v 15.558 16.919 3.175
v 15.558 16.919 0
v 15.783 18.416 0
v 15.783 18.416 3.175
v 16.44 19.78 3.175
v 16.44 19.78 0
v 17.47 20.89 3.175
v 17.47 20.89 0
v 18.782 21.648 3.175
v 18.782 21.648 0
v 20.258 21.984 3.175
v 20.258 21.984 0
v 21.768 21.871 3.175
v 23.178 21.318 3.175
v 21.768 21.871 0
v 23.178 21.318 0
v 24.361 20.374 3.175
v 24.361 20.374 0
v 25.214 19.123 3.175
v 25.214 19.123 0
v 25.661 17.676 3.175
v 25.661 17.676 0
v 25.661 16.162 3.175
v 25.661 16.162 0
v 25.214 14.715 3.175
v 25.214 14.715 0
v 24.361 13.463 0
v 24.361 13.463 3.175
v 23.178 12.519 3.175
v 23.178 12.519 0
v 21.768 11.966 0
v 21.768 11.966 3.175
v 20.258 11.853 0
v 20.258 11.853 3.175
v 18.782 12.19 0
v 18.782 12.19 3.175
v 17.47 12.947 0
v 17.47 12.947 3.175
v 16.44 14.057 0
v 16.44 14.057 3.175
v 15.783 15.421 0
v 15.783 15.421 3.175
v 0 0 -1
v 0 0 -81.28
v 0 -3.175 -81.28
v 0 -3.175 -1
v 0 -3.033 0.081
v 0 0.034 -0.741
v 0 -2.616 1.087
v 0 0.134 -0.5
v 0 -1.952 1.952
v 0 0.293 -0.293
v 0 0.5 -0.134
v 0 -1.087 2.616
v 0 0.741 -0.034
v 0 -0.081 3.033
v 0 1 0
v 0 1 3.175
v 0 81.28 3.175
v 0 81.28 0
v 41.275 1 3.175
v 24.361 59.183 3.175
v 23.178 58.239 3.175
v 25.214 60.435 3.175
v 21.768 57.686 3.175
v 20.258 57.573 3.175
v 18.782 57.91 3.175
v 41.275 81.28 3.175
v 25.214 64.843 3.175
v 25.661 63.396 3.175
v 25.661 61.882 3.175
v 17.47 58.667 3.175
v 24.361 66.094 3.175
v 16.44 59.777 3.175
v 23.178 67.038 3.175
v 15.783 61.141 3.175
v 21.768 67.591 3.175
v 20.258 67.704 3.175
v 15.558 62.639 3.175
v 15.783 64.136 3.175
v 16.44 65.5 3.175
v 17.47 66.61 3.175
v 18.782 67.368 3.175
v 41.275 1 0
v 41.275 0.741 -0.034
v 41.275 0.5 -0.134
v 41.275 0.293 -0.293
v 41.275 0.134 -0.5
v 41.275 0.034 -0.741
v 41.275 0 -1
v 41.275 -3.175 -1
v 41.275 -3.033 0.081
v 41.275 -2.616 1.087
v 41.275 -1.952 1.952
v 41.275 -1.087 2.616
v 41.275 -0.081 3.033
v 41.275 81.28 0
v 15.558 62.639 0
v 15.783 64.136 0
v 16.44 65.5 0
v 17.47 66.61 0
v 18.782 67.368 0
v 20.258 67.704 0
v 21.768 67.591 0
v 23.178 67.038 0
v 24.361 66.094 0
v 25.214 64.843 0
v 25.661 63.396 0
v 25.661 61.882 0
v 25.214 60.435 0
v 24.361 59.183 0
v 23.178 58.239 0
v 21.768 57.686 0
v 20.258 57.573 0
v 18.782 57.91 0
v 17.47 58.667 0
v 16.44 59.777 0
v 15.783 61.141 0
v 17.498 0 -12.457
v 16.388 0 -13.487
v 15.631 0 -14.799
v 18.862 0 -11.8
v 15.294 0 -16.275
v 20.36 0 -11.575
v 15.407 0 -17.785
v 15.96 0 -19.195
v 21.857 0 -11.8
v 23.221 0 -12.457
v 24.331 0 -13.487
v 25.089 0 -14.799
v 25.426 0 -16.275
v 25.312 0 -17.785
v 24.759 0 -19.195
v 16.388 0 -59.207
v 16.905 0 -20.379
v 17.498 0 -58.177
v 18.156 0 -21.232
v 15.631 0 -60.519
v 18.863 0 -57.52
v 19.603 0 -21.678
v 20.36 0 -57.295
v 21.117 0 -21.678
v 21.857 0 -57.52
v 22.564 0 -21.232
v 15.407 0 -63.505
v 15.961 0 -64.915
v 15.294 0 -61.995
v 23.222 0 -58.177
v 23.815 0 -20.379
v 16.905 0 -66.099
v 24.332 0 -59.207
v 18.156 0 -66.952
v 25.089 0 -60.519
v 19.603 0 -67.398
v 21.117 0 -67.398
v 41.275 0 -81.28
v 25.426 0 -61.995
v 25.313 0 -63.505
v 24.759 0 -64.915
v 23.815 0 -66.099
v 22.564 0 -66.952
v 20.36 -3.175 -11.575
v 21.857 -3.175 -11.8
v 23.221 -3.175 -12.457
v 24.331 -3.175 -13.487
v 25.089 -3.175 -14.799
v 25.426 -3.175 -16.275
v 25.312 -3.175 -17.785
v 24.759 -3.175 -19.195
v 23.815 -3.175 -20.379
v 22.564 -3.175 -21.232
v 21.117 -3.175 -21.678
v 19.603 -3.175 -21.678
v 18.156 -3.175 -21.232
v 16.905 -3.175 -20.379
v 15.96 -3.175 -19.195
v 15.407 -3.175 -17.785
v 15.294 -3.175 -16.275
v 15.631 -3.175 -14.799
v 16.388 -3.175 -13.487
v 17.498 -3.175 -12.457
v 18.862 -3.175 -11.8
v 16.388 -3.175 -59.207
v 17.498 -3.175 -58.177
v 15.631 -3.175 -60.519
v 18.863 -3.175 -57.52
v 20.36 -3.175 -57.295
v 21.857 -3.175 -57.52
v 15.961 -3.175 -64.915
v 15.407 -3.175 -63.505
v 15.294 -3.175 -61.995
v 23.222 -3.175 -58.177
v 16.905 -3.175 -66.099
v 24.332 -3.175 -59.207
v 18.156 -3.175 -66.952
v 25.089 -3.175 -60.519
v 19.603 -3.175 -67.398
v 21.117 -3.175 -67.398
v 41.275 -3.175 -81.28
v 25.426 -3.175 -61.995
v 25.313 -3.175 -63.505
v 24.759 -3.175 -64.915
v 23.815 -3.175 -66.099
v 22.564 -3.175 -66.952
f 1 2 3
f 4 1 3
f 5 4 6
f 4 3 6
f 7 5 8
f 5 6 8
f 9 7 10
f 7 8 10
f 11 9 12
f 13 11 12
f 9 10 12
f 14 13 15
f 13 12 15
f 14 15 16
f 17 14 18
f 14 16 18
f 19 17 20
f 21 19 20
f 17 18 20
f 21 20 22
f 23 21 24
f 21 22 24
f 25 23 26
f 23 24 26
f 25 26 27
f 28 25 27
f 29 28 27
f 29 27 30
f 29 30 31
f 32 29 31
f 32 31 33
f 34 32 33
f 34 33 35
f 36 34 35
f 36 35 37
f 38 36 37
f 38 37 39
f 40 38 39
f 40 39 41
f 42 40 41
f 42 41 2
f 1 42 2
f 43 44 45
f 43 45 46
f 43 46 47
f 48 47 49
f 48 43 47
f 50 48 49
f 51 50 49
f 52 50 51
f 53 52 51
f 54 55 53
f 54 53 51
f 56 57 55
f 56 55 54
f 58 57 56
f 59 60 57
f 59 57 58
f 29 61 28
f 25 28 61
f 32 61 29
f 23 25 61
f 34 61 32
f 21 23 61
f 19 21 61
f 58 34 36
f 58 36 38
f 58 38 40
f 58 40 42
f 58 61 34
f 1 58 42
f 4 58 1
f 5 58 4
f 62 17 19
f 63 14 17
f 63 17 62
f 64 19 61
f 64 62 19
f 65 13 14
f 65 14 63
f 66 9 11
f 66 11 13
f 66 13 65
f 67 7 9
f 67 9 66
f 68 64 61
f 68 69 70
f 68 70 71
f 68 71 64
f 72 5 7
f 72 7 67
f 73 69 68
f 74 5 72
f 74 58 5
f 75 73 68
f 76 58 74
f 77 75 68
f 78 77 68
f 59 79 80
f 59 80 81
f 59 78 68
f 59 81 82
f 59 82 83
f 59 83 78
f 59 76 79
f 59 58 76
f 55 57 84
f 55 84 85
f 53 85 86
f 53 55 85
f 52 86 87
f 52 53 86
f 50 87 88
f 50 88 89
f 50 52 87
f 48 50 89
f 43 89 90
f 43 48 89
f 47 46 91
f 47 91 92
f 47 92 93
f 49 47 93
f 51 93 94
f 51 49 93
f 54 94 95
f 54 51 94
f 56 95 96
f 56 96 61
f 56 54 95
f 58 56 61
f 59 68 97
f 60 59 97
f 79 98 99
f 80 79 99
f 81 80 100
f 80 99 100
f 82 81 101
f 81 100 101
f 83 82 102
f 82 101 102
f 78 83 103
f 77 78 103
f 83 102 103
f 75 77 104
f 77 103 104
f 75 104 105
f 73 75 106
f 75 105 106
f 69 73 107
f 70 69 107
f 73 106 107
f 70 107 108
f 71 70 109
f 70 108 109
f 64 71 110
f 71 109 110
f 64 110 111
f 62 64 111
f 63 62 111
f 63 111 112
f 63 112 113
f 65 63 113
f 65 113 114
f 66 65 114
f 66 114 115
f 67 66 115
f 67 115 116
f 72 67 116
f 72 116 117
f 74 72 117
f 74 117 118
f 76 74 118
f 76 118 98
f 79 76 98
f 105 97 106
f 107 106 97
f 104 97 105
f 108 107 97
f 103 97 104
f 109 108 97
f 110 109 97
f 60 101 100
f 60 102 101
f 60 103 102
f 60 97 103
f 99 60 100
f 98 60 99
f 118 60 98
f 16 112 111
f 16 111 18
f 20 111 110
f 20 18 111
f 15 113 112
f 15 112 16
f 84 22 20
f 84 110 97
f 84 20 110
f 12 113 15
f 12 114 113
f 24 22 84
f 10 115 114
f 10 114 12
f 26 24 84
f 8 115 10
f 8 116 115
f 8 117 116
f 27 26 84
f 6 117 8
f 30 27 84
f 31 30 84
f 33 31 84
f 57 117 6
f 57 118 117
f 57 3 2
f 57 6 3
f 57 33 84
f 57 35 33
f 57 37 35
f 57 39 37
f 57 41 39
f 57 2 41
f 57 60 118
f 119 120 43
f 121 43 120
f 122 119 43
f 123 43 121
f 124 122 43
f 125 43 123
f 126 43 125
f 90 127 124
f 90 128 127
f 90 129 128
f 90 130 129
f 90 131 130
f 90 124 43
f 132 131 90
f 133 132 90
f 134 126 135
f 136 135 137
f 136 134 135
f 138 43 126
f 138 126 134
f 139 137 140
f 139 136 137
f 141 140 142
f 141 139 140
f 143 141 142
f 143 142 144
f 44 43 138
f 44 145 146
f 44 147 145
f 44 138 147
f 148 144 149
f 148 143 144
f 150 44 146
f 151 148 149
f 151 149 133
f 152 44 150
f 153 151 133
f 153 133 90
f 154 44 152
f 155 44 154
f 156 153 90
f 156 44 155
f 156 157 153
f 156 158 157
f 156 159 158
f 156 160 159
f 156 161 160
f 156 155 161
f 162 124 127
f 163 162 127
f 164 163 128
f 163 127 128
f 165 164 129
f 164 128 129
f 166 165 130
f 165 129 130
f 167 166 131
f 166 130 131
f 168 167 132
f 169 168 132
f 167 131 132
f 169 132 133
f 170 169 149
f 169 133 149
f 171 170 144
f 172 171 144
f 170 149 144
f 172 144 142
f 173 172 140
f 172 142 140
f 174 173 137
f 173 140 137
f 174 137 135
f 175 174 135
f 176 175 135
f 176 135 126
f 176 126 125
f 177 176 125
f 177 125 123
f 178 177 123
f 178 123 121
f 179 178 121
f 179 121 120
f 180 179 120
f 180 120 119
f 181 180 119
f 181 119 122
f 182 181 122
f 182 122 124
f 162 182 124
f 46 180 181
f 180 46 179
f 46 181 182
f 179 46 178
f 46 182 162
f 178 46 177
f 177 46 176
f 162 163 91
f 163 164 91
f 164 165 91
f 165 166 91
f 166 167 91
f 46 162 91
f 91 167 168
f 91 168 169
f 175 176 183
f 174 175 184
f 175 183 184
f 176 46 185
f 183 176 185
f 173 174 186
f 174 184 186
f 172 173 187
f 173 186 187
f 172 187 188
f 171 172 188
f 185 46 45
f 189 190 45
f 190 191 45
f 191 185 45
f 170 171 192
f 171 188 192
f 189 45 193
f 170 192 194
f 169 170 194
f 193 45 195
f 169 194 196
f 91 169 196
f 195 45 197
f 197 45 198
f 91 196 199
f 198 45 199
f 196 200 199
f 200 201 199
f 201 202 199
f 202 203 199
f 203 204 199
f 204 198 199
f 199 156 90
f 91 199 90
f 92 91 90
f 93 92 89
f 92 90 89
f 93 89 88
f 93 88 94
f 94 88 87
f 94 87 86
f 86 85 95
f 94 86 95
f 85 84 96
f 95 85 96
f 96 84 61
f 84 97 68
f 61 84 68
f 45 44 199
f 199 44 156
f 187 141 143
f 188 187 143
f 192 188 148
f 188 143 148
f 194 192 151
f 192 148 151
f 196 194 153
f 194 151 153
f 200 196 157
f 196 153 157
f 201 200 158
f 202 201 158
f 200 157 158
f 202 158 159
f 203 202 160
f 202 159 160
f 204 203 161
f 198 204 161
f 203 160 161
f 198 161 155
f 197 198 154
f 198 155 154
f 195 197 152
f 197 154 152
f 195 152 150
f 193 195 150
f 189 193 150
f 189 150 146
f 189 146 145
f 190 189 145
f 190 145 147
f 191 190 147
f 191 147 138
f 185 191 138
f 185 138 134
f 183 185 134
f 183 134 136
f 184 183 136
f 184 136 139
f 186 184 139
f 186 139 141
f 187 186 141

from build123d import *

# Parameters (mm, degrees)
SKETCH2_W                    = 41.275
SKETCH2_H                    = 81.28
BASE_FLANGE1_DEPTH           = 3.175
EDGE_FLANGE1_STRIP_W         = 14.7
EDGE_FLANGE1_STRIP_H         = 3.175
EDGE_FLANGE1_STRIP_CUT_DEPTH = 41.275
EDGE_FLANGE1_DEPTH           = 41.275
CUT_EXTRUDE1_REACH           = 124.133
SKETCH10_R                   = 5.08
CUT_EXTRUDE3_REACH           = 124.133
SKETCH12_R                   = 5.08


# Sheet-metal steps are written as plain solids
with BuildPart() as part:
    # Sketch2 → Base-Flange1 (new body)
    with BuildSketch(Plane(origin=(0, 0, 0), x_dir=(1, 0, 0), z_dir=(0, 1, 0))):
        with Locations((20.6375, 40.64)):
            Rectangle(SKETCH2_W, SKETCH2_H)
    extrude(amount=-BASE_FLANGE1_DEPTH)

    # Edge-Flange1 strip (across the edge) → Edge-Flange1 strip cut (cut)
    with BuildSketch(Plane(origin=(0, 0, 0), x_dir=(0, 0, -1), z_dir=(1, 0, 0))):
        with Locations((-6.35, -1.5875)):
            Rectangle(EDGE_FLANGE1_STRIP_W, EDGE_FLANGE1_STRIP_H)
    extrude(amount=EDGE_FLANGE1_STRIP_CUT_DEPTH, mode=Mode.SUBTRACT)

    # Edge-Flange1 section (across the edge) → Edge-Flange1 (add)
    with BuildSketch(Plane(origin=(0, 0, 0), x_dir=(0, 0, -1), z_dir=(1, 0, 0))):
        with BuildLine():
            Line((-3.175, 1), (-3.175, 81.28))
            Line((-3.175, 81.28), (0, 81.28))
            Line((0, 81.28), (0, 1))
            ThreePointArc((0, 1), (0.292893219, 0.292893219), (1, 0))
            Line((1, 0), (1, -3.175))
            ThreePointArc((1, -3.175), (-1.952170811, -1.952170811), (-3.175, 1))
        make_face()
    extrude(amount=EDGE_FLANGE1_DEPTH)

    # Sketch10 → Cut-Extrude1 (cut, up to next)
    with BuildSketch(Plane(origin=(0, 0, 0), x_dir=(-1, 0, 0), z_dir=(0, 0, -1)), mode=Mode.PRIVATE) as cut_extrude1_sk1:
        with Locations((-20.6375, 62.638675326)):
            Circle(SKETCH10_R)
    cut_extrude1_tool1 = extrude(cut_extrude1_sk1.sketch, amount=-CUT_EXTRUDE1_REACH, mode=Mode.PRIVATE) & part.part
    # Sketch10 → Cut-Extrude1 (cut, up to next)
    with BuildSketch(Plane(origin=(0, 0, 0), x_dir=(-1, 0, 0), z_dir=(0, 0, -1)), mode=Mode.PRIVATE) as cut_extrude1_sk2:
        with Locations((-20.6375, 16.918675326)):
            Circle(SKETCH10_R)
    cut_extrude1_tool2 = extrude(cut_extrude1_sk2.sketch, amount=-CUT_EXTRUDE1_REACH, mode=Mode.PRIVATE) & part.part
    add(cut_extrude1_tool1.solids().sort_by_distance((20.6375, 62.638675, 0))[0], mode=Mode.SUBTRACT)
    add(cut_extrude1_tool2.solids().sort_by_distance((20.6375, 16.918675, 0))[0], mode=Mode.SUBTRACT)

    # Sketch12 → Cut-Extrude3 (cut, up to next)
    with BuildSketch(Plane(origin=(0, 0, 0), x_dir=(1, 0, 0), z_dir=(0, 1, 0)), mode=Mode.PRIVATE) as cut_extrude3_sk1:
        with Locations(Location((20.359792254, 16.65462957, 0), (0, 0, 270))):
            Circle(SKETCH12_R)
    cut_extrude3_tool1 = extrude(cut_extrude3_sk1.sketch, amount=-CUT_EXTRUDE3_REACH, mode=Mode.PRIVATE) & part.part
    # Sketch12 → Cut-Extrude3 (cut, up to next)
    with BuildSketch(Plane(origin=(0, 0, 0), x_dir=(1, 0, 0), z_dir=(0, 1, 0)), mode=Mode.PRIVATE) as cut_extrude3_sk2:
        with Locations(Location((20.360011307, 62.374629569, 0), (0, 0, 270))):
            Circle(SKETCH12_R)
    cut_extrude3_tool2 = extrude(cut_extrude3_sk2.sketch, amount=-CUT_EXTRUDE3_REACH, mode=Mode.PRIVATE) & part.part
    add(cut_extrude3_tool1.solids().sort_by_distance((20.359792, 0, -16.65463))[0], mode=Mode.SUBTRACT)
    add(cut_extrude3_tool2.solids().sort_by_distance((20.360011, 0, -62.37463))[0], mode=Mode.SUBTRACT)


solid = part.part
